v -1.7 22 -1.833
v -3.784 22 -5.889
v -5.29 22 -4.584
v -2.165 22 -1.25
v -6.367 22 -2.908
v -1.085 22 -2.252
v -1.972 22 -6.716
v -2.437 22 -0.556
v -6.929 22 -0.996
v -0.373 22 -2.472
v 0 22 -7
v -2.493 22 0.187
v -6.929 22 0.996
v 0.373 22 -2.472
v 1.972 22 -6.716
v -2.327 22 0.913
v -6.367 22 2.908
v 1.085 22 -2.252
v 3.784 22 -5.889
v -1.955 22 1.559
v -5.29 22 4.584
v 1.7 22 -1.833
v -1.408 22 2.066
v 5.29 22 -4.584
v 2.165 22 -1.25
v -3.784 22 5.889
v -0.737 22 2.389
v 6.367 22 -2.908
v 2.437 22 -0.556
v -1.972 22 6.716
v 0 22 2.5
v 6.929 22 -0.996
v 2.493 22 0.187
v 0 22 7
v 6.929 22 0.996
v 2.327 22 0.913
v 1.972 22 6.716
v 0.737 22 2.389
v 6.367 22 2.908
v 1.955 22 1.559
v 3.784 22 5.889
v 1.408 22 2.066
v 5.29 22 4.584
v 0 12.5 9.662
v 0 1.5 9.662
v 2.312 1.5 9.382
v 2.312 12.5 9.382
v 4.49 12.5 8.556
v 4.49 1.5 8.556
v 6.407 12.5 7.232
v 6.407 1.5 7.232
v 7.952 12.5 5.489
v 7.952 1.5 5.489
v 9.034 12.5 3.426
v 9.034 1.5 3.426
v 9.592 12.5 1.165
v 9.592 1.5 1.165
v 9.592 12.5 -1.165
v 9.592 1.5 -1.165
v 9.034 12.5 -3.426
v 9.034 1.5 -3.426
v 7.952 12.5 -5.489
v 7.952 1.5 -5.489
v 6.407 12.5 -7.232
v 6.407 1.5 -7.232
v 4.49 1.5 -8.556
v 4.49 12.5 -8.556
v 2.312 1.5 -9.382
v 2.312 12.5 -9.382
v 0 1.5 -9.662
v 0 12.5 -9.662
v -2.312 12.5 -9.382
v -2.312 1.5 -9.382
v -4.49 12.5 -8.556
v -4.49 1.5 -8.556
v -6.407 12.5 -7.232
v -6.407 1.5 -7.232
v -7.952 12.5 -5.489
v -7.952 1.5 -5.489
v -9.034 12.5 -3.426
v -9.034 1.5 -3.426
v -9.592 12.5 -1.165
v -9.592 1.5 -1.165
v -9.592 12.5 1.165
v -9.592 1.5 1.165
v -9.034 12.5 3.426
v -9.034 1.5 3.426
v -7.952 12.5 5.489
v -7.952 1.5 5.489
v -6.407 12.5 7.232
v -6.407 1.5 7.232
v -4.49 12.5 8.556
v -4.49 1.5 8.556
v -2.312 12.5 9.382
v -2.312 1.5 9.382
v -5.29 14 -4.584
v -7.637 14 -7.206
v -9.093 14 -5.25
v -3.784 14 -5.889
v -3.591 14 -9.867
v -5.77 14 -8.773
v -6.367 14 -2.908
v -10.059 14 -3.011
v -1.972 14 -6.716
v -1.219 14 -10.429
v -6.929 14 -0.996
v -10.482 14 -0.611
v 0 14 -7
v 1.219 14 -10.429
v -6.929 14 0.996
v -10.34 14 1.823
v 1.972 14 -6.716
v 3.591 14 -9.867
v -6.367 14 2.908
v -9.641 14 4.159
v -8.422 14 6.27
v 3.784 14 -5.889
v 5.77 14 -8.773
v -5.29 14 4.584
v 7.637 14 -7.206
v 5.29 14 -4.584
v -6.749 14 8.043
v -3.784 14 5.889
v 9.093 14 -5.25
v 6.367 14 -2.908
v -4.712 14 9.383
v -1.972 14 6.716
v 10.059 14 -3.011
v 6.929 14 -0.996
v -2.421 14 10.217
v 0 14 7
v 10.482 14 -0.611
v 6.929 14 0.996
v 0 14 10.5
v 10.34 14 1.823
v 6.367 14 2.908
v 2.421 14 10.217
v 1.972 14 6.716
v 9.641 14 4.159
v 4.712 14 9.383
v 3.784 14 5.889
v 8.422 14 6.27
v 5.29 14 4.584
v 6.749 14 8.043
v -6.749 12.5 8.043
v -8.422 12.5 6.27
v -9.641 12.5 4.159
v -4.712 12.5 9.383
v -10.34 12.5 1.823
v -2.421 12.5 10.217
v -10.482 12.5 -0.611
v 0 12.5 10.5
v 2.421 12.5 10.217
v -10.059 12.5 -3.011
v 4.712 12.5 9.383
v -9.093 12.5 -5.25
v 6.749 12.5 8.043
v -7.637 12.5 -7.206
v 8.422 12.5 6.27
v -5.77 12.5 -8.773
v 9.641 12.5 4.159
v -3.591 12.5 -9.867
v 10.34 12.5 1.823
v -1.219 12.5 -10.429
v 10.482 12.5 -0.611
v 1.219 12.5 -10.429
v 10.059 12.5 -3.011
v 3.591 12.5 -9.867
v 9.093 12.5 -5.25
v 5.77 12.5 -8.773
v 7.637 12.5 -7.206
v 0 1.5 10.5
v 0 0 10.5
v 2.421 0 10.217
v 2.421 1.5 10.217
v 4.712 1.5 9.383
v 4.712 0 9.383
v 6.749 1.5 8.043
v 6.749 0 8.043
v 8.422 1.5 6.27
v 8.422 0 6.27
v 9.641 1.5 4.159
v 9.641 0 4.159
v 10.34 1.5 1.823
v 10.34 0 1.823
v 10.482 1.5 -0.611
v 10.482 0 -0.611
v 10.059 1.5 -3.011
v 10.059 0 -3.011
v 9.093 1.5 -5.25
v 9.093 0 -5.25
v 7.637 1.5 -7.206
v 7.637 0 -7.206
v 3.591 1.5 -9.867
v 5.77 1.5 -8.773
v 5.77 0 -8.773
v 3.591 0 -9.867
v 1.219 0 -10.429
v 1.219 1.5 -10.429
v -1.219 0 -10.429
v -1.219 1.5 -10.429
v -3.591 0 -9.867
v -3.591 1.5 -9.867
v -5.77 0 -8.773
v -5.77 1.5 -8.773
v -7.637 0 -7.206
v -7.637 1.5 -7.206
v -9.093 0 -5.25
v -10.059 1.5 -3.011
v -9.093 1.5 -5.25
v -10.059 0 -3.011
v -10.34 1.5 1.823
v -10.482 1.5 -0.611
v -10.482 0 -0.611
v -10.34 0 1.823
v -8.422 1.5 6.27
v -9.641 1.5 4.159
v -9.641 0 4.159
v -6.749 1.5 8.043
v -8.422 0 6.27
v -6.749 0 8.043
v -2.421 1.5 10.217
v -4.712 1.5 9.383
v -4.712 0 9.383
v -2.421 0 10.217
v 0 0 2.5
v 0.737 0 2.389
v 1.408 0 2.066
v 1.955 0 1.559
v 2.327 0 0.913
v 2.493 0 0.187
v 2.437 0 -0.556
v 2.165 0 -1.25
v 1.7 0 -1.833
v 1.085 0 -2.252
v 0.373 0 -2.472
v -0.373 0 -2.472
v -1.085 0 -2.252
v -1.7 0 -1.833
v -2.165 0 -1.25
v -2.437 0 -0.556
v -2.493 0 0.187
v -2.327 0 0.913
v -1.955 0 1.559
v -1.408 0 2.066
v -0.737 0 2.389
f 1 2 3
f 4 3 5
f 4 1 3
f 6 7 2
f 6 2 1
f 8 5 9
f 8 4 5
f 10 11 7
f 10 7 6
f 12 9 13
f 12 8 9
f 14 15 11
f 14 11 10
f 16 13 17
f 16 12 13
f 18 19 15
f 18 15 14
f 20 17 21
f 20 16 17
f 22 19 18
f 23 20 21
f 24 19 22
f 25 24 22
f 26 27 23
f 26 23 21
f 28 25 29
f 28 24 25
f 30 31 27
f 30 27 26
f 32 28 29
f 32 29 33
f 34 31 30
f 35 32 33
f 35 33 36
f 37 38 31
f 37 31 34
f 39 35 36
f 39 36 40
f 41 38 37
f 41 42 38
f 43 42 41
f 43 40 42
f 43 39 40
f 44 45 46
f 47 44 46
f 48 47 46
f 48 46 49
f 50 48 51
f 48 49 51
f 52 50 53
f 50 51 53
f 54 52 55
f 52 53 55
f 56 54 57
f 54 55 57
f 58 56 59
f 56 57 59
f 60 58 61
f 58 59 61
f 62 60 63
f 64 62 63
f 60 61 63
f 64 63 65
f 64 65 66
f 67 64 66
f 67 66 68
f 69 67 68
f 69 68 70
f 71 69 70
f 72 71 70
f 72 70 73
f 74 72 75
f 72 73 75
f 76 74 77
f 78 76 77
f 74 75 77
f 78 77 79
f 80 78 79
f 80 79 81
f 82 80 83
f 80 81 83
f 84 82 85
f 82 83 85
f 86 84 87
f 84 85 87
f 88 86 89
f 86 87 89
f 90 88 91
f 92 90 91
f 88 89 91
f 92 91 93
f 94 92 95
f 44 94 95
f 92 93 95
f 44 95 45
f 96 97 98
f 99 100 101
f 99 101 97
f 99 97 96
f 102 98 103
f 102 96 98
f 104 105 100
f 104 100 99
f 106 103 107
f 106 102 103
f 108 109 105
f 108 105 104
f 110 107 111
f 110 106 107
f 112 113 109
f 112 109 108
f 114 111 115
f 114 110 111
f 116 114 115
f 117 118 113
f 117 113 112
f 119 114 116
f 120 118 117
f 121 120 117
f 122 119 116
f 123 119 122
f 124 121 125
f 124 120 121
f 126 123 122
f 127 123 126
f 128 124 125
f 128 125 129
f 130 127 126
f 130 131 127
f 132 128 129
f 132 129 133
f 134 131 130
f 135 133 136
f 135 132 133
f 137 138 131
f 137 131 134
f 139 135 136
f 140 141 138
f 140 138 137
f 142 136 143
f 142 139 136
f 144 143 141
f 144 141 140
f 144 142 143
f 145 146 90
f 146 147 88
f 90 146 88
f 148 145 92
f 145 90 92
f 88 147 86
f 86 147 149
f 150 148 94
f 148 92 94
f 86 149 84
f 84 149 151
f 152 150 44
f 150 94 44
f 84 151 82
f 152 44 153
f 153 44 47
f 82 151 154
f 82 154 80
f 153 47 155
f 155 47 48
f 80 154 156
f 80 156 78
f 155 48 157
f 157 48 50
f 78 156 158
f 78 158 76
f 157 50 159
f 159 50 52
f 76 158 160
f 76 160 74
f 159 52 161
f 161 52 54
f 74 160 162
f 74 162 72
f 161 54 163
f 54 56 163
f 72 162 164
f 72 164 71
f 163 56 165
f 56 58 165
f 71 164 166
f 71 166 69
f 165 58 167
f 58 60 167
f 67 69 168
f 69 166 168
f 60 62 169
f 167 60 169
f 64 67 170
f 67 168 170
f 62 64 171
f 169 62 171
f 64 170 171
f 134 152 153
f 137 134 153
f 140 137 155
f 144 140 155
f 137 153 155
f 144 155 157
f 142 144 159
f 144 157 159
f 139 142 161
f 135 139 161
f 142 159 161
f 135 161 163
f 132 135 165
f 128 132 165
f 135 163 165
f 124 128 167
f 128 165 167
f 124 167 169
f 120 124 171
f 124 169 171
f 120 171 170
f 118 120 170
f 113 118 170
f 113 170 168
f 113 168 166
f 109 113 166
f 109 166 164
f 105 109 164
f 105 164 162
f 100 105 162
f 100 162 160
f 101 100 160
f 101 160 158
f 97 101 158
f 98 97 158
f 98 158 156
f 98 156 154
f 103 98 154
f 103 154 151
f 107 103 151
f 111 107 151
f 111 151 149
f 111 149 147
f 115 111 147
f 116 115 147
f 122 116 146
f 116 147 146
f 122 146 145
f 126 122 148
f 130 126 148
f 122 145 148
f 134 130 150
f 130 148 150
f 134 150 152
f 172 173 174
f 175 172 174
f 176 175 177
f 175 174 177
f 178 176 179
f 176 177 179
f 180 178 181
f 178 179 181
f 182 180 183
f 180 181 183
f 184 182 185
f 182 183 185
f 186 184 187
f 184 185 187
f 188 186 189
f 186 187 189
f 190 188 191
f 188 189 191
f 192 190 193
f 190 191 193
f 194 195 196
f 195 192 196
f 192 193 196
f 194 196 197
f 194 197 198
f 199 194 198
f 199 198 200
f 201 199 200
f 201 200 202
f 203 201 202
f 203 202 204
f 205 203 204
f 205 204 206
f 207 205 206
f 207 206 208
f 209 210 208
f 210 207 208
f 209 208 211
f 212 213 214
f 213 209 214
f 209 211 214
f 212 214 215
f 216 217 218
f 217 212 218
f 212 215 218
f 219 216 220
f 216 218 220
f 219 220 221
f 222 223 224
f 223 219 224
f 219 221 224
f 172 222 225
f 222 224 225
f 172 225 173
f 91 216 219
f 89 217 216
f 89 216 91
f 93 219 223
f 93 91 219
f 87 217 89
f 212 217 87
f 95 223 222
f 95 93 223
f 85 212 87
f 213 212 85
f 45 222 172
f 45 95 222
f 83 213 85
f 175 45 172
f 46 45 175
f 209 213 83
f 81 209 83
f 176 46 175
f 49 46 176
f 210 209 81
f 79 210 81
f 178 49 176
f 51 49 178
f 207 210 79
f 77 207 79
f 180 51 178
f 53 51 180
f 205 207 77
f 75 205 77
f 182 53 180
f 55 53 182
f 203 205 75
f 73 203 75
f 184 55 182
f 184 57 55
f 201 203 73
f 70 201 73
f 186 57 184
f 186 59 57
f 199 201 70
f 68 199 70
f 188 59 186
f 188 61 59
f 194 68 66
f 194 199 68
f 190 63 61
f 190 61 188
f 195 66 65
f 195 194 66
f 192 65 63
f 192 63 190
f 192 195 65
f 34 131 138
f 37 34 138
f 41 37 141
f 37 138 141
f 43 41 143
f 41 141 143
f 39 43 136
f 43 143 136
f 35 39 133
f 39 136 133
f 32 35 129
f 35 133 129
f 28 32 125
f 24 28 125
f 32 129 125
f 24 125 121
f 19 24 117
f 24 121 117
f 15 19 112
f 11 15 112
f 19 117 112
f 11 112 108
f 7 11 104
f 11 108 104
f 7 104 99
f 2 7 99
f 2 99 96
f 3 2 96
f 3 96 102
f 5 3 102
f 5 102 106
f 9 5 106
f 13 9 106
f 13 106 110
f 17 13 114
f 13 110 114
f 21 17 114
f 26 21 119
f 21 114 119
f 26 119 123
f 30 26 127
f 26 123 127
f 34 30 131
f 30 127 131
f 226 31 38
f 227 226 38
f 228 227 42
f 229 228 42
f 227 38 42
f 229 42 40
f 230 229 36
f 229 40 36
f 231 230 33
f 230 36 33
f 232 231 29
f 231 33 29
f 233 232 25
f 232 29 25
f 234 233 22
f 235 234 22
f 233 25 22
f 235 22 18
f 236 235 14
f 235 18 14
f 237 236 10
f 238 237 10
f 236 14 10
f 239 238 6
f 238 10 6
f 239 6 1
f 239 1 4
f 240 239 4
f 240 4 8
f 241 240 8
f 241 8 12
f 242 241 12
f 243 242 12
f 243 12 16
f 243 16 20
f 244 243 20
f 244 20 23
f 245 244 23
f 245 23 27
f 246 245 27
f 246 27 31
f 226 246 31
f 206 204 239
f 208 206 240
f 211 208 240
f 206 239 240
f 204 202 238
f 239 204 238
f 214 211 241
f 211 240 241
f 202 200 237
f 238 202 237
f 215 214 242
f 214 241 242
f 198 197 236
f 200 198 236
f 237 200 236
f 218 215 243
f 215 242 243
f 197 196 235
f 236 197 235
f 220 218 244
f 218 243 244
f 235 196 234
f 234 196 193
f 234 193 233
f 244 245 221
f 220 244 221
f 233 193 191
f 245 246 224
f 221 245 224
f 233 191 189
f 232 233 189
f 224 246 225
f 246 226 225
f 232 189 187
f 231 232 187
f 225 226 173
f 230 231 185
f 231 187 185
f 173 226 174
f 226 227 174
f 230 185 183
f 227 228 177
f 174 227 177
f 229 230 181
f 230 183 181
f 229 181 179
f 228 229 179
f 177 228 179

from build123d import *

# Parameters (mm, degrees)
SKETCH1_R           = 10.5
BOSS_EXTRUDE1_DEPTH = 14
SKETCH2_R           = 7
BOSS_EXTRUDE2_DEPTH = 8
SKETCH3_R           = 2.5
CUT_EXTRUDE1_DEPTH  = 27.54241888
CUT_EXTRUDE2_START  = 1.5
SKETCH4_OUTSIDE_W   = 30.392
SKETCH4_OUTSIDE_H   = 30.392
SKETCH4_OUTSIDE_R   = 9.6623253
CUT_EXTRUDE2_DEPTH  = 11


with BuildPart() as part:
    # Sketch1 → Boss-Extrude1 (new body)
    with BuildSketch(Plane(origin=(0, 0, 0), x_dir=(1, 0, 0), z_dir=(0, 1, 0))):
        with Locations(Location((0, 0, 0), (0, 0, 270))):
            Circle(SKETCH1_R)
    extrude(amount=BOSS_EXTRUDE1_DEPTH)

    # Sketch2 → Boss-Extrude2 (add)
    with BuildSketch(Plane(origin=(0, 14, 0), x_dir=(1, 0, 0), z_dir=(0, 1, 0))):
        with Locations(Location((0, 0, 0), (0, 0, 270))):
            Circle(SKETCH2_R)
    extrude(amount=BOSS_EXTRUDE2_DEPTH)

    # Sketch3 → Cut-Extrude1 (cut, through all)
    with BuildSketch(Plane(origin=(0, 22, 0), x_dir=(1, 0, 0), z_dir=(0, 1, 0))):
        with Locations(Location((0, 0, 0), (0, 0, 270))):
            Circle(SKETCH3_R)
    extrude(amount=-CUT_EXTRUDE1_DEPTH, mode=Mode.SUBTRACT)

    # Sketch4 outside → Cut-Extrude2 (cut)
    with BuildSketch(Plane(origin=(0, 0, 0), x_dir=(1, 0, 0), z_dir=(0, 1, 0)).offset(CUT_EXTRUDE2_START)):
        Rectangle(SKETCH4_OUTSIDE_W, SKETCH4_OUTSIDE_H)
        with Locations(Location((0, 0, 0), (0, 0, 270))):
            Circle(SKETCH4_OUTSIDE_R, mode=Mode.SUBTRACT)
    extrude(amount=CUT_EXTRUDE2_DEPTH, mode=Mode.SUBTRACT)


solid = part.part
